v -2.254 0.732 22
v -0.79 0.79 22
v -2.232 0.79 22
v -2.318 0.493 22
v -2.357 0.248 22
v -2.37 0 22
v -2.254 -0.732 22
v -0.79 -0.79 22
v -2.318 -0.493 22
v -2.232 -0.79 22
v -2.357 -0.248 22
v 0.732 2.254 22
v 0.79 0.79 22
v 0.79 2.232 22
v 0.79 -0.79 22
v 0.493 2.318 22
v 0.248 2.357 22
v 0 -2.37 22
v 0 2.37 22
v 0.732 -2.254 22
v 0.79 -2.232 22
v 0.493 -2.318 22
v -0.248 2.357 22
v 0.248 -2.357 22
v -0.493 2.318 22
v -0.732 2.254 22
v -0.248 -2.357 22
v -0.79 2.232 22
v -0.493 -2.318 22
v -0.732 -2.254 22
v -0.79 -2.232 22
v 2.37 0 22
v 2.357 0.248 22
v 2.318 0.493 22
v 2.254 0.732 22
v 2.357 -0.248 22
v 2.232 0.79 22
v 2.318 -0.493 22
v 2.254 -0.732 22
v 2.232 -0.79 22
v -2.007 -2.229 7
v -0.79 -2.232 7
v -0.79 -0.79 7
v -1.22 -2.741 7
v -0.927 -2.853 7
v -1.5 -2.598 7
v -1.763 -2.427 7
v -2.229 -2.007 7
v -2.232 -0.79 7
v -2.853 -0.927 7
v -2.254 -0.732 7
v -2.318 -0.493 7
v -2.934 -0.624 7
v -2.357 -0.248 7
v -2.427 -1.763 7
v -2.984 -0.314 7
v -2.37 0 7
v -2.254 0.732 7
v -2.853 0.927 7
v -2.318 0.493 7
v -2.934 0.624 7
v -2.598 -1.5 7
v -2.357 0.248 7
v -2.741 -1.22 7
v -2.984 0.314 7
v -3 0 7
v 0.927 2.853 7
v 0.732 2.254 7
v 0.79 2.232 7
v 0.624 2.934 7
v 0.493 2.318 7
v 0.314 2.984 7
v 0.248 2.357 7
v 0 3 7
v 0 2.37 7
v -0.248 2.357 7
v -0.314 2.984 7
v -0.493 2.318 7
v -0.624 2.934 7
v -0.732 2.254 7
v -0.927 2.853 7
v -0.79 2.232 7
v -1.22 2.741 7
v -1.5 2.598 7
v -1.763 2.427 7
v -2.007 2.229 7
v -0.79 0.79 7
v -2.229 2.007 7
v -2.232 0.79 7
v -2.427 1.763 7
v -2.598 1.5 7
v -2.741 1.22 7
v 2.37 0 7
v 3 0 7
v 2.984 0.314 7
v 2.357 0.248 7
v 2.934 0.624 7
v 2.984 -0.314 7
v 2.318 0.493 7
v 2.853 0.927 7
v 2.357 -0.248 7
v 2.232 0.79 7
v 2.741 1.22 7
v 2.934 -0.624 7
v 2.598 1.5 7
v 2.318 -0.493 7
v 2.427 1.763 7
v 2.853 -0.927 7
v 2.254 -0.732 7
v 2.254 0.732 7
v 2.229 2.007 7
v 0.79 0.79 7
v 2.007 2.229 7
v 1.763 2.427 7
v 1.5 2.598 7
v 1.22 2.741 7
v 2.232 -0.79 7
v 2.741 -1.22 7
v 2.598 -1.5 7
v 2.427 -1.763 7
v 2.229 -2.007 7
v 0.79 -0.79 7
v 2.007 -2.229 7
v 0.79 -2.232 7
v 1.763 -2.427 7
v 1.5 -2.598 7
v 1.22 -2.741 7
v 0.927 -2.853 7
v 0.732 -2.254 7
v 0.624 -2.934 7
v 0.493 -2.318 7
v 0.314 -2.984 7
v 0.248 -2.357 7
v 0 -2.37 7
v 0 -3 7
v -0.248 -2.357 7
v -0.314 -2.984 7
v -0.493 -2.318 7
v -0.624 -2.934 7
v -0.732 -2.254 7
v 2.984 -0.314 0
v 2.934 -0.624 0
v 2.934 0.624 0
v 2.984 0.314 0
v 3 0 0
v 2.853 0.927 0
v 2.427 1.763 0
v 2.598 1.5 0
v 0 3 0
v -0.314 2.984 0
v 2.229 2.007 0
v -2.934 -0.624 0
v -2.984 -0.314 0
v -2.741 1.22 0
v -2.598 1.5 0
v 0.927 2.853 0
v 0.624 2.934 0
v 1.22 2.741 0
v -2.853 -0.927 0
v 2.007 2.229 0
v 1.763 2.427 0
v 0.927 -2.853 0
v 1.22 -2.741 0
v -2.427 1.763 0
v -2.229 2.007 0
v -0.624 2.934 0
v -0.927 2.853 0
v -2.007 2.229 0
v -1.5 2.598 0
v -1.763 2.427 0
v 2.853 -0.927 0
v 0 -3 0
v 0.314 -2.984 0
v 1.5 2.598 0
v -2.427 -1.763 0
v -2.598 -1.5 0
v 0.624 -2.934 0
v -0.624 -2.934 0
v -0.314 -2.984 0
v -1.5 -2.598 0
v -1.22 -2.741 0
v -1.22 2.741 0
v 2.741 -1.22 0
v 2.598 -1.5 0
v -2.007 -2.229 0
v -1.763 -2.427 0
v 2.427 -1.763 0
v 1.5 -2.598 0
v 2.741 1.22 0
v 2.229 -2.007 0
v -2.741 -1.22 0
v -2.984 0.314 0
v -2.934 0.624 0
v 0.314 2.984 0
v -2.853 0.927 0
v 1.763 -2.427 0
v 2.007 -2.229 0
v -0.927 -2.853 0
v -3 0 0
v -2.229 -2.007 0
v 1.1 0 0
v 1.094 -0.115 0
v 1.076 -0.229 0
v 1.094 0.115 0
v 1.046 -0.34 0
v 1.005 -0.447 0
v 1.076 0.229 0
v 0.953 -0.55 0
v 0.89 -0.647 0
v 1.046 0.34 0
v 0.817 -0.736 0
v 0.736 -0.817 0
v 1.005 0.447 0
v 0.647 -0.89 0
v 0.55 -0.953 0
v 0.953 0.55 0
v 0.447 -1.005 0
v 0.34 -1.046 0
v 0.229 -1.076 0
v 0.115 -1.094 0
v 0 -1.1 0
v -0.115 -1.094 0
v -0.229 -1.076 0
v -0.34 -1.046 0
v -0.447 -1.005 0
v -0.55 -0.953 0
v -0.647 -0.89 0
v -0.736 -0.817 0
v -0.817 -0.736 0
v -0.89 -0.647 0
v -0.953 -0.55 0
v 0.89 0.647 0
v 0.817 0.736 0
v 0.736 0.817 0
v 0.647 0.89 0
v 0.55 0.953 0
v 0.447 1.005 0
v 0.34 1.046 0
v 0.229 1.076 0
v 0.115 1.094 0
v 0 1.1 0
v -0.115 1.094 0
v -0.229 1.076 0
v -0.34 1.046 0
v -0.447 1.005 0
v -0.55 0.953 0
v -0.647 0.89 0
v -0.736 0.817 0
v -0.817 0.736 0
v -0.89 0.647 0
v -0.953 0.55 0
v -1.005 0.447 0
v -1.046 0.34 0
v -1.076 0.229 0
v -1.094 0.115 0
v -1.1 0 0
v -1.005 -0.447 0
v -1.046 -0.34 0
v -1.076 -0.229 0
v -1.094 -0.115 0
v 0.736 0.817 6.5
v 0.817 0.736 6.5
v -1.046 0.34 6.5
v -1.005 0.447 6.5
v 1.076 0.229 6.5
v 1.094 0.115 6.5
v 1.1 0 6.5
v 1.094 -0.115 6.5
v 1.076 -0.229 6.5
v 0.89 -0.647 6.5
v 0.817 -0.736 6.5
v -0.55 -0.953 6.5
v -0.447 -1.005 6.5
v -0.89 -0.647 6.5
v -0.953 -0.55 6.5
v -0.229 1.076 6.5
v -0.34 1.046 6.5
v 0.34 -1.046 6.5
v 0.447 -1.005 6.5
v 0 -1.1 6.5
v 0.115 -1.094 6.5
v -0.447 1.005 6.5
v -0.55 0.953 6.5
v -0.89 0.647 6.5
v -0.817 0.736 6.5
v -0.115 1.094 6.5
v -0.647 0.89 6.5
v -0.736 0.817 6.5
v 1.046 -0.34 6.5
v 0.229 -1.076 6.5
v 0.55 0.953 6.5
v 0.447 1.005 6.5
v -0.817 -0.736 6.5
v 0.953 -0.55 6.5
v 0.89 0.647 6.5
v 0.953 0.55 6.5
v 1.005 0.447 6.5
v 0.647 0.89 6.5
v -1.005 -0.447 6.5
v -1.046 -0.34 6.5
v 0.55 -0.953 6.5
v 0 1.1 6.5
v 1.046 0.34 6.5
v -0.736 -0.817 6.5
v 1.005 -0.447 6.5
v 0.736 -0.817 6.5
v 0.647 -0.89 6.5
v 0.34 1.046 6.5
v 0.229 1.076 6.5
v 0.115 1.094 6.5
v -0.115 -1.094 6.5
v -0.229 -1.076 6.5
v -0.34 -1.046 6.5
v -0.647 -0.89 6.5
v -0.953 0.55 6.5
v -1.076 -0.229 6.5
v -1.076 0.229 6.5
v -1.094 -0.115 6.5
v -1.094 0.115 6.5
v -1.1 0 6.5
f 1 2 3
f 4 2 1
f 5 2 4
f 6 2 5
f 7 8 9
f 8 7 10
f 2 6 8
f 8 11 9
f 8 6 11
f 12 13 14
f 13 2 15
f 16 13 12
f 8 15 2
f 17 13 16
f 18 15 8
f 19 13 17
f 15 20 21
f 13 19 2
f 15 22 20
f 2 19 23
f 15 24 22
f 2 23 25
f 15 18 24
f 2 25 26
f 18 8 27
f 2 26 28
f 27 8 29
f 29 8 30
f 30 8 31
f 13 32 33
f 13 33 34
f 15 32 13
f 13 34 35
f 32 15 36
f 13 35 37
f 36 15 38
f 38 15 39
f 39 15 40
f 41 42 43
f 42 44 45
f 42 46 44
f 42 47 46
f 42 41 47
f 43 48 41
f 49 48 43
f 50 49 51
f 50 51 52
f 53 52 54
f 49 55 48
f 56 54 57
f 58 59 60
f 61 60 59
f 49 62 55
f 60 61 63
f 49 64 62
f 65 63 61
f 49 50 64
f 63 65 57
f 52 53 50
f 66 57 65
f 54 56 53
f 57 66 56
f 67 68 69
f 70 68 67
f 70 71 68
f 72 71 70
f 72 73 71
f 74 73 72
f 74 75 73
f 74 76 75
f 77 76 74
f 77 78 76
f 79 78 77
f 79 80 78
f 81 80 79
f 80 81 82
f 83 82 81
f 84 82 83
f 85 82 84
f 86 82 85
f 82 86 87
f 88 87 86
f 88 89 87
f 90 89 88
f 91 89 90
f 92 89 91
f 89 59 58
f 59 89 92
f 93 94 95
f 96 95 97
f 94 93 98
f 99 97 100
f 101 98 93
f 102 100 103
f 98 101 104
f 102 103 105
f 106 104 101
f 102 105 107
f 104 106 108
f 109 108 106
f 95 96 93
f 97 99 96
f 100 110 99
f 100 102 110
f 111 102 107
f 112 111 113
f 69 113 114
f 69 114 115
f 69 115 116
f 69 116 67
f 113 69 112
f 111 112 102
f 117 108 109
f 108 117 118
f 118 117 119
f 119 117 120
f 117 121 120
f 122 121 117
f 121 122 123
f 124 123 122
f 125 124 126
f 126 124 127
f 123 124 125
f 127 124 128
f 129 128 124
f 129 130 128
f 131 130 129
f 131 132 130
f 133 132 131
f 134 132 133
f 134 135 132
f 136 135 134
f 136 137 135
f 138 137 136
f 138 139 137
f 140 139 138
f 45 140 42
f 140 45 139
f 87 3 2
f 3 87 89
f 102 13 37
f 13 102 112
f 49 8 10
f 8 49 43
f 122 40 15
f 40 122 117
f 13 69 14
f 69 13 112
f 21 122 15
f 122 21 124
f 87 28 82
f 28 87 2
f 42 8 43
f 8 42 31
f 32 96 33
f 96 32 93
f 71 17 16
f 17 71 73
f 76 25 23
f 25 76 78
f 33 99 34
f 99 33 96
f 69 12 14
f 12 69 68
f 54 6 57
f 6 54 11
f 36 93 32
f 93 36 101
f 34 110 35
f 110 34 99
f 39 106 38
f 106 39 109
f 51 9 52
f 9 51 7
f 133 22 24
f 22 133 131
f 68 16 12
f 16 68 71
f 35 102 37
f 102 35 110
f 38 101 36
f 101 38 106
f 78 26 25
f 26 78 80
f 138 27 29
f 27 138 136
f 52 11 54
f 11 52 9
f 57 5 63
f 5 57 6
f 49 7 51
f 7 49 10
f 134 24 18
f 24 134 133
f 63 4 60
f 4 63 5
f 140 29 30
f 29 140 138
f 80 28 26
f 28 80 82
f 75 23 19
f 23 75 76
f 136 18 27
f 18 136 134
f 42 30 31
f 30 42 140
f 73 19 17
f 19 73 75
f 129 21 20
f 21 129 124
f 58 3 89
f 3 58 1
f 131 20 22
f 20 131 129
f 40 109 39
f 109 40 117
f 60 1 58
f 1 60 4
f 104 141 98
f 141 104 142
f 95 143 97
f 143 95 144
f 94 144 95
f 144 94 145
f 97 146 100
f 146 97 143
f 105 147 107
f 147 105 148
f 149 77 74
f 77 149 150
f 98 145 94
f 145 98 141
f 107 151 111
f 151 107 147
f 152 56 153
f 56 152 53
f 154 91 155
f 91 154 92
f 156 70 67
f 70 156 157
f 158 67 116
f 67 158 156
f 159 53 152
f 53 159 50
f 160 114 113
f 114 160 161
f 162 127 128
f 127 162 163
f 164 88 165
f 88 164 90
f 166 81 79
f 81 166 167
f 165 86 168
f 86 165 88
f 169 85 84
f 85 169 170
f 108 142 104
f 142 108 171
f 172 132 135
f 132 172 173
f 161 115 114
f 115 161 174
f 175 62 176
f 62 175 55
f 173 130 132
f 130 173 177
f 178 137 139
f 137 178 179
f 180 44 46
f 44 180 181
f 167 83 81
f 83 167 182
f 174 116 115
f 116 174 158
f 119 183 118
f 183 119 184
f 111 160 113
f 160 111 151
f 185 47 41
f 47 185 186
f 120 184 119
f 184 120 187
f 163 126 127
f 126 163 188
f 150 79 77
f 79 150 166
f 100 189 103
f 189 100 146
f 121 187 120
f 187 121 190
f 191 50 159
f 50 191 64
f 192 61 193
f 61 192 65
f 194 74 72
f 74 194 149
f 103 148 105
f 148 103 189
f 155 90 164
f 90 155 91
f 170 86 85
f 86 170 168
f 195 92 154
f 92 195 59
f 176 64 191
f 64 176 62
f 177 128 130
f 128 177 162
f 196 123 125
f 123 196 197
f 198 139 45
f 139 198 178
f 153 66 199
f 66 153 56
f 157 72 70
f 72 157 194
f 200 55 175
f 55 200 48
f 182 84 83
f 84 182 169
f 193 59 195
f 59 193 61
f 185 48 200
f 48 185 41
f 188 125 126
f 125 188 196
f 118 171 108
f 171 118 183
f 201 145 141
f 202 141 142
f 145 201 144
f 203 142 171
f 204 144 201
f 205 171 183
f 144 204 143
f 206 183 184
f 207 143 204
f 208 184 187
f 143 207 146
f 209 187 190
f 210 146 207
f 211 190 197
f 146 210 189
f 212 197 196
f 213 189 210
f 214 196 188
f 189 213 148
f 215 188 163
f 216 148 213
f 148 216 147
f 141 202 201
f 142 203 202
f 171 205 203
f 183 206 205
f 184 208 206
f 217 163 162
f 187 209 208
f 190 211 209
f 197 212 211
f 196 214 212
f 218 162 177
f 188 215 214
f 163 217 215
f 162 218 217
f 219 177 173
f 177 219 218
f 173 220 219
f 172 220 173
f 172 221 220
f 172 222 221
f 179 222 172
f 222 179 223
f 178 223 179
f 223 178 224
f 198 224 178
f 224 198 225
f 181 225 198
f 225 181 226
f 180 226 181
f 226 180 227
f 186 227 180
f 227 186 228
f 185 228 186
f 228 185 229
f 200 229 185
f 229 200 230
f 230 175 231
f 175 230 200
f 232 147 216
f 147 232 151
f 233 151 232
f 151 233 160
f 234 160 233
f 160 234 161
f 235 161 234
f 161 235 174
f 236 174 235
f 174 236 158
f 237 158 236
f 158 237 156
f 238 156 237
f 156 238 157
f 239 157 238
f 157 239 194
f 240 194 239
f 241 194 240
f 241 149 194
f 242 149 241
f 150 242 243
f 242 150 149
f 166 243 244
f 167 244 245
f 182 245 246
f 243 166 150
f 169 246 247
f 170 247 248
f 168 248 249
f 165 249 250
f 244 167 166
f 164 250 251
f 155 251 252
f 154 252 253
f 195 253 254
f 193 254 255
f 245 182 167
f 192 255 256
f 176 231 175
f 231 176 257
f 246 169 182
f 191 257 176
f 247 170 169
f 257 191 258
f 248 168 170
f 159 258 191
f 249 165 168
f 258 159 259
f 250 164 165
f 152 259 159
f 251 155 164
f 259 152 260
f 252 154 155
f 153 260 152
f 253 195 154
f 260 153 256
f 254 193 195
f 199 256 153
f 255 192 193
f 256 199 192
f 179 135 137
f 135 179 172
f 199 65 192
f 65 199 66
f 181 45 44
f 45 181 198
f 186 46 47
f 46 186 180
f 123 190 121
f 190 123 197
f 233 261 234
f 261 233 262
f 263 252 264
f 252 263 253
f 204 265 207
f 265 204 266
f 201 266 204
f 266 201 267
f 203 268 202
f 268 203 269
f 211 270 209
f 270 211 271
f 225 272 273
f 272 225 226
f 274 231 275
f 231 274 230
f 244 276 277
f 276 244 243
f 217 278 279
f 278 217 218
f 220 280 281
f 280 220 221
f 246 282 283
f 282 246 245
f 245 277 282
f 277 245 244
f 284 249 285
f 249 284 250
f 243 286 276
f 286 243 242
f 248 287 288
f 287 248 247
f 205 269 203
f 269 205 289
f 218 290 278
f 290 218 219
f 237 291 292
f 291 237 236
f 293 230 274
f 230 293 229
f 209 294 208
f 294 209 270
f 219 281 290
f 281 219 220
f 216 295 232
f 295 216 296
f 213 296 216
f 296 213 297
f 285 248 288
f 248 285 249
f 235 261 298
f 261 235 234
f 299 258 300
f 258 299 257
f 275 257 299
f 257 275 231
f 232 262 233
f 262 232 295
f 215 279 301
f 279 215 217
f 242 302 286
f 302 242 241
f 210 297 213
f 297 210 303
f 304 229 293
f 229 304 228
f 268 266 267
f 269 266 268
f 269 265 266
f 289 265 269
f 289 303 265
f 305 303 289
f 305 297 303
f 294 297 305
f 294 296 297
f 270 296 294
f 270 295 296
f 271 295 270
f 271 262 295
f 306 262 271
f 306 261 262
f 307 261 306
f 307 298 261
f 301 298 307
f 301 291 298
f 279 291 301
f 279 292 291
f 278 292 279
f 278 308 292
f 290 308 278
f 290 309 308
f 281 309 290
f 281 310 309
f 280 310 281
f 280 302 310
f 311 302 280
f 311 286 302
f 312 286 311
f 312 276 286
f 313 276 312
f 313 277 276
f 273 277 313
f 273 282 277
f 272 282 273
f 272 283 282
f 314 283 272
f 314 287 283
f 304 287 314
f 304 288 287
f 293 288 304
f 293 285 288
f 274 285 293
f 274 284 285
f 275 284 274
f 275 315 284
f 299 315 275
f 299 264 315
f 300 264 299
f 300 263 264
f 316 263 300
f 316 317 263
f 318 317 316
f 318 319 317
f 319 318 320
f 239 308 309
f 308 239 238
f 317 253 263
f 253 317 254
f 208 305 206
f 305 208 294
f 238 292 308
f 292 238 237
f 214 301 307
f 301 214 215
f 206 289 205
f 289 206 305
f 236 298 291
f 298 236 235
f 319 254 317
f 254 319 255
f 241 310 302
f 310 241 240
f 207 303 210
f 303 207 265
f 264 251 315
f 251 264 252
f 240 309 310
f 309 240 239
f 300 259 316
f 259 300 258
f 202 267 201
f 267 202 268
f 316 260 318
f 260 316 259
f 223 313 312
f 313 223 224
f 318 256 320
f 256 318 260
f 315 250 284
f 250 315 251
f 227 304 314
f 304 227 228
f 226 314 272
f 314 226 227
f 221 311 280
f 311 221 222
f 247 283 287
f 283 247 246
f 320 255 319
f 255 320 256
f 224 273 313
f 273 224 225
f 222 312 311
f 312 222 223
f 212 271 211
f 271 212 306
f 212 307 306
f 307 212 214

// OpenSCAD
base_length = 7;
base_diameter = 6;
shaft_length = 15;
hole_length = 6.5;
hole_diameter = 2.2; // 2.2mm hole appears to be good tight fit for motor shaft (maybe slightly too tight?)

shaft_xy_rescale = 1.0; // multiplicative factor to rescale the official technic dimensions

difference() {
    union() {
        translate([0,0,base_length]) scale([shaft_xy_rescale,shaft_xy_rescale,1]) technic_x(shaft_length);  
                                                                // technic cross head
        cylinder(base_length,d=base_diameter,true,$fn=60);      // base cylinder
    }
    cylinder(hole_length,d=hole_diameter,true,$fn=60);          
}

module technic_x (length=20) {
    intersection() {
        cylinder(length,d=4.74,true,$fn=60);
    
        translate([0,0,(length/2)]) {
            cube([5,1.58,length], true);
            cube([1.58,5,length], true);
        }
    }
}
